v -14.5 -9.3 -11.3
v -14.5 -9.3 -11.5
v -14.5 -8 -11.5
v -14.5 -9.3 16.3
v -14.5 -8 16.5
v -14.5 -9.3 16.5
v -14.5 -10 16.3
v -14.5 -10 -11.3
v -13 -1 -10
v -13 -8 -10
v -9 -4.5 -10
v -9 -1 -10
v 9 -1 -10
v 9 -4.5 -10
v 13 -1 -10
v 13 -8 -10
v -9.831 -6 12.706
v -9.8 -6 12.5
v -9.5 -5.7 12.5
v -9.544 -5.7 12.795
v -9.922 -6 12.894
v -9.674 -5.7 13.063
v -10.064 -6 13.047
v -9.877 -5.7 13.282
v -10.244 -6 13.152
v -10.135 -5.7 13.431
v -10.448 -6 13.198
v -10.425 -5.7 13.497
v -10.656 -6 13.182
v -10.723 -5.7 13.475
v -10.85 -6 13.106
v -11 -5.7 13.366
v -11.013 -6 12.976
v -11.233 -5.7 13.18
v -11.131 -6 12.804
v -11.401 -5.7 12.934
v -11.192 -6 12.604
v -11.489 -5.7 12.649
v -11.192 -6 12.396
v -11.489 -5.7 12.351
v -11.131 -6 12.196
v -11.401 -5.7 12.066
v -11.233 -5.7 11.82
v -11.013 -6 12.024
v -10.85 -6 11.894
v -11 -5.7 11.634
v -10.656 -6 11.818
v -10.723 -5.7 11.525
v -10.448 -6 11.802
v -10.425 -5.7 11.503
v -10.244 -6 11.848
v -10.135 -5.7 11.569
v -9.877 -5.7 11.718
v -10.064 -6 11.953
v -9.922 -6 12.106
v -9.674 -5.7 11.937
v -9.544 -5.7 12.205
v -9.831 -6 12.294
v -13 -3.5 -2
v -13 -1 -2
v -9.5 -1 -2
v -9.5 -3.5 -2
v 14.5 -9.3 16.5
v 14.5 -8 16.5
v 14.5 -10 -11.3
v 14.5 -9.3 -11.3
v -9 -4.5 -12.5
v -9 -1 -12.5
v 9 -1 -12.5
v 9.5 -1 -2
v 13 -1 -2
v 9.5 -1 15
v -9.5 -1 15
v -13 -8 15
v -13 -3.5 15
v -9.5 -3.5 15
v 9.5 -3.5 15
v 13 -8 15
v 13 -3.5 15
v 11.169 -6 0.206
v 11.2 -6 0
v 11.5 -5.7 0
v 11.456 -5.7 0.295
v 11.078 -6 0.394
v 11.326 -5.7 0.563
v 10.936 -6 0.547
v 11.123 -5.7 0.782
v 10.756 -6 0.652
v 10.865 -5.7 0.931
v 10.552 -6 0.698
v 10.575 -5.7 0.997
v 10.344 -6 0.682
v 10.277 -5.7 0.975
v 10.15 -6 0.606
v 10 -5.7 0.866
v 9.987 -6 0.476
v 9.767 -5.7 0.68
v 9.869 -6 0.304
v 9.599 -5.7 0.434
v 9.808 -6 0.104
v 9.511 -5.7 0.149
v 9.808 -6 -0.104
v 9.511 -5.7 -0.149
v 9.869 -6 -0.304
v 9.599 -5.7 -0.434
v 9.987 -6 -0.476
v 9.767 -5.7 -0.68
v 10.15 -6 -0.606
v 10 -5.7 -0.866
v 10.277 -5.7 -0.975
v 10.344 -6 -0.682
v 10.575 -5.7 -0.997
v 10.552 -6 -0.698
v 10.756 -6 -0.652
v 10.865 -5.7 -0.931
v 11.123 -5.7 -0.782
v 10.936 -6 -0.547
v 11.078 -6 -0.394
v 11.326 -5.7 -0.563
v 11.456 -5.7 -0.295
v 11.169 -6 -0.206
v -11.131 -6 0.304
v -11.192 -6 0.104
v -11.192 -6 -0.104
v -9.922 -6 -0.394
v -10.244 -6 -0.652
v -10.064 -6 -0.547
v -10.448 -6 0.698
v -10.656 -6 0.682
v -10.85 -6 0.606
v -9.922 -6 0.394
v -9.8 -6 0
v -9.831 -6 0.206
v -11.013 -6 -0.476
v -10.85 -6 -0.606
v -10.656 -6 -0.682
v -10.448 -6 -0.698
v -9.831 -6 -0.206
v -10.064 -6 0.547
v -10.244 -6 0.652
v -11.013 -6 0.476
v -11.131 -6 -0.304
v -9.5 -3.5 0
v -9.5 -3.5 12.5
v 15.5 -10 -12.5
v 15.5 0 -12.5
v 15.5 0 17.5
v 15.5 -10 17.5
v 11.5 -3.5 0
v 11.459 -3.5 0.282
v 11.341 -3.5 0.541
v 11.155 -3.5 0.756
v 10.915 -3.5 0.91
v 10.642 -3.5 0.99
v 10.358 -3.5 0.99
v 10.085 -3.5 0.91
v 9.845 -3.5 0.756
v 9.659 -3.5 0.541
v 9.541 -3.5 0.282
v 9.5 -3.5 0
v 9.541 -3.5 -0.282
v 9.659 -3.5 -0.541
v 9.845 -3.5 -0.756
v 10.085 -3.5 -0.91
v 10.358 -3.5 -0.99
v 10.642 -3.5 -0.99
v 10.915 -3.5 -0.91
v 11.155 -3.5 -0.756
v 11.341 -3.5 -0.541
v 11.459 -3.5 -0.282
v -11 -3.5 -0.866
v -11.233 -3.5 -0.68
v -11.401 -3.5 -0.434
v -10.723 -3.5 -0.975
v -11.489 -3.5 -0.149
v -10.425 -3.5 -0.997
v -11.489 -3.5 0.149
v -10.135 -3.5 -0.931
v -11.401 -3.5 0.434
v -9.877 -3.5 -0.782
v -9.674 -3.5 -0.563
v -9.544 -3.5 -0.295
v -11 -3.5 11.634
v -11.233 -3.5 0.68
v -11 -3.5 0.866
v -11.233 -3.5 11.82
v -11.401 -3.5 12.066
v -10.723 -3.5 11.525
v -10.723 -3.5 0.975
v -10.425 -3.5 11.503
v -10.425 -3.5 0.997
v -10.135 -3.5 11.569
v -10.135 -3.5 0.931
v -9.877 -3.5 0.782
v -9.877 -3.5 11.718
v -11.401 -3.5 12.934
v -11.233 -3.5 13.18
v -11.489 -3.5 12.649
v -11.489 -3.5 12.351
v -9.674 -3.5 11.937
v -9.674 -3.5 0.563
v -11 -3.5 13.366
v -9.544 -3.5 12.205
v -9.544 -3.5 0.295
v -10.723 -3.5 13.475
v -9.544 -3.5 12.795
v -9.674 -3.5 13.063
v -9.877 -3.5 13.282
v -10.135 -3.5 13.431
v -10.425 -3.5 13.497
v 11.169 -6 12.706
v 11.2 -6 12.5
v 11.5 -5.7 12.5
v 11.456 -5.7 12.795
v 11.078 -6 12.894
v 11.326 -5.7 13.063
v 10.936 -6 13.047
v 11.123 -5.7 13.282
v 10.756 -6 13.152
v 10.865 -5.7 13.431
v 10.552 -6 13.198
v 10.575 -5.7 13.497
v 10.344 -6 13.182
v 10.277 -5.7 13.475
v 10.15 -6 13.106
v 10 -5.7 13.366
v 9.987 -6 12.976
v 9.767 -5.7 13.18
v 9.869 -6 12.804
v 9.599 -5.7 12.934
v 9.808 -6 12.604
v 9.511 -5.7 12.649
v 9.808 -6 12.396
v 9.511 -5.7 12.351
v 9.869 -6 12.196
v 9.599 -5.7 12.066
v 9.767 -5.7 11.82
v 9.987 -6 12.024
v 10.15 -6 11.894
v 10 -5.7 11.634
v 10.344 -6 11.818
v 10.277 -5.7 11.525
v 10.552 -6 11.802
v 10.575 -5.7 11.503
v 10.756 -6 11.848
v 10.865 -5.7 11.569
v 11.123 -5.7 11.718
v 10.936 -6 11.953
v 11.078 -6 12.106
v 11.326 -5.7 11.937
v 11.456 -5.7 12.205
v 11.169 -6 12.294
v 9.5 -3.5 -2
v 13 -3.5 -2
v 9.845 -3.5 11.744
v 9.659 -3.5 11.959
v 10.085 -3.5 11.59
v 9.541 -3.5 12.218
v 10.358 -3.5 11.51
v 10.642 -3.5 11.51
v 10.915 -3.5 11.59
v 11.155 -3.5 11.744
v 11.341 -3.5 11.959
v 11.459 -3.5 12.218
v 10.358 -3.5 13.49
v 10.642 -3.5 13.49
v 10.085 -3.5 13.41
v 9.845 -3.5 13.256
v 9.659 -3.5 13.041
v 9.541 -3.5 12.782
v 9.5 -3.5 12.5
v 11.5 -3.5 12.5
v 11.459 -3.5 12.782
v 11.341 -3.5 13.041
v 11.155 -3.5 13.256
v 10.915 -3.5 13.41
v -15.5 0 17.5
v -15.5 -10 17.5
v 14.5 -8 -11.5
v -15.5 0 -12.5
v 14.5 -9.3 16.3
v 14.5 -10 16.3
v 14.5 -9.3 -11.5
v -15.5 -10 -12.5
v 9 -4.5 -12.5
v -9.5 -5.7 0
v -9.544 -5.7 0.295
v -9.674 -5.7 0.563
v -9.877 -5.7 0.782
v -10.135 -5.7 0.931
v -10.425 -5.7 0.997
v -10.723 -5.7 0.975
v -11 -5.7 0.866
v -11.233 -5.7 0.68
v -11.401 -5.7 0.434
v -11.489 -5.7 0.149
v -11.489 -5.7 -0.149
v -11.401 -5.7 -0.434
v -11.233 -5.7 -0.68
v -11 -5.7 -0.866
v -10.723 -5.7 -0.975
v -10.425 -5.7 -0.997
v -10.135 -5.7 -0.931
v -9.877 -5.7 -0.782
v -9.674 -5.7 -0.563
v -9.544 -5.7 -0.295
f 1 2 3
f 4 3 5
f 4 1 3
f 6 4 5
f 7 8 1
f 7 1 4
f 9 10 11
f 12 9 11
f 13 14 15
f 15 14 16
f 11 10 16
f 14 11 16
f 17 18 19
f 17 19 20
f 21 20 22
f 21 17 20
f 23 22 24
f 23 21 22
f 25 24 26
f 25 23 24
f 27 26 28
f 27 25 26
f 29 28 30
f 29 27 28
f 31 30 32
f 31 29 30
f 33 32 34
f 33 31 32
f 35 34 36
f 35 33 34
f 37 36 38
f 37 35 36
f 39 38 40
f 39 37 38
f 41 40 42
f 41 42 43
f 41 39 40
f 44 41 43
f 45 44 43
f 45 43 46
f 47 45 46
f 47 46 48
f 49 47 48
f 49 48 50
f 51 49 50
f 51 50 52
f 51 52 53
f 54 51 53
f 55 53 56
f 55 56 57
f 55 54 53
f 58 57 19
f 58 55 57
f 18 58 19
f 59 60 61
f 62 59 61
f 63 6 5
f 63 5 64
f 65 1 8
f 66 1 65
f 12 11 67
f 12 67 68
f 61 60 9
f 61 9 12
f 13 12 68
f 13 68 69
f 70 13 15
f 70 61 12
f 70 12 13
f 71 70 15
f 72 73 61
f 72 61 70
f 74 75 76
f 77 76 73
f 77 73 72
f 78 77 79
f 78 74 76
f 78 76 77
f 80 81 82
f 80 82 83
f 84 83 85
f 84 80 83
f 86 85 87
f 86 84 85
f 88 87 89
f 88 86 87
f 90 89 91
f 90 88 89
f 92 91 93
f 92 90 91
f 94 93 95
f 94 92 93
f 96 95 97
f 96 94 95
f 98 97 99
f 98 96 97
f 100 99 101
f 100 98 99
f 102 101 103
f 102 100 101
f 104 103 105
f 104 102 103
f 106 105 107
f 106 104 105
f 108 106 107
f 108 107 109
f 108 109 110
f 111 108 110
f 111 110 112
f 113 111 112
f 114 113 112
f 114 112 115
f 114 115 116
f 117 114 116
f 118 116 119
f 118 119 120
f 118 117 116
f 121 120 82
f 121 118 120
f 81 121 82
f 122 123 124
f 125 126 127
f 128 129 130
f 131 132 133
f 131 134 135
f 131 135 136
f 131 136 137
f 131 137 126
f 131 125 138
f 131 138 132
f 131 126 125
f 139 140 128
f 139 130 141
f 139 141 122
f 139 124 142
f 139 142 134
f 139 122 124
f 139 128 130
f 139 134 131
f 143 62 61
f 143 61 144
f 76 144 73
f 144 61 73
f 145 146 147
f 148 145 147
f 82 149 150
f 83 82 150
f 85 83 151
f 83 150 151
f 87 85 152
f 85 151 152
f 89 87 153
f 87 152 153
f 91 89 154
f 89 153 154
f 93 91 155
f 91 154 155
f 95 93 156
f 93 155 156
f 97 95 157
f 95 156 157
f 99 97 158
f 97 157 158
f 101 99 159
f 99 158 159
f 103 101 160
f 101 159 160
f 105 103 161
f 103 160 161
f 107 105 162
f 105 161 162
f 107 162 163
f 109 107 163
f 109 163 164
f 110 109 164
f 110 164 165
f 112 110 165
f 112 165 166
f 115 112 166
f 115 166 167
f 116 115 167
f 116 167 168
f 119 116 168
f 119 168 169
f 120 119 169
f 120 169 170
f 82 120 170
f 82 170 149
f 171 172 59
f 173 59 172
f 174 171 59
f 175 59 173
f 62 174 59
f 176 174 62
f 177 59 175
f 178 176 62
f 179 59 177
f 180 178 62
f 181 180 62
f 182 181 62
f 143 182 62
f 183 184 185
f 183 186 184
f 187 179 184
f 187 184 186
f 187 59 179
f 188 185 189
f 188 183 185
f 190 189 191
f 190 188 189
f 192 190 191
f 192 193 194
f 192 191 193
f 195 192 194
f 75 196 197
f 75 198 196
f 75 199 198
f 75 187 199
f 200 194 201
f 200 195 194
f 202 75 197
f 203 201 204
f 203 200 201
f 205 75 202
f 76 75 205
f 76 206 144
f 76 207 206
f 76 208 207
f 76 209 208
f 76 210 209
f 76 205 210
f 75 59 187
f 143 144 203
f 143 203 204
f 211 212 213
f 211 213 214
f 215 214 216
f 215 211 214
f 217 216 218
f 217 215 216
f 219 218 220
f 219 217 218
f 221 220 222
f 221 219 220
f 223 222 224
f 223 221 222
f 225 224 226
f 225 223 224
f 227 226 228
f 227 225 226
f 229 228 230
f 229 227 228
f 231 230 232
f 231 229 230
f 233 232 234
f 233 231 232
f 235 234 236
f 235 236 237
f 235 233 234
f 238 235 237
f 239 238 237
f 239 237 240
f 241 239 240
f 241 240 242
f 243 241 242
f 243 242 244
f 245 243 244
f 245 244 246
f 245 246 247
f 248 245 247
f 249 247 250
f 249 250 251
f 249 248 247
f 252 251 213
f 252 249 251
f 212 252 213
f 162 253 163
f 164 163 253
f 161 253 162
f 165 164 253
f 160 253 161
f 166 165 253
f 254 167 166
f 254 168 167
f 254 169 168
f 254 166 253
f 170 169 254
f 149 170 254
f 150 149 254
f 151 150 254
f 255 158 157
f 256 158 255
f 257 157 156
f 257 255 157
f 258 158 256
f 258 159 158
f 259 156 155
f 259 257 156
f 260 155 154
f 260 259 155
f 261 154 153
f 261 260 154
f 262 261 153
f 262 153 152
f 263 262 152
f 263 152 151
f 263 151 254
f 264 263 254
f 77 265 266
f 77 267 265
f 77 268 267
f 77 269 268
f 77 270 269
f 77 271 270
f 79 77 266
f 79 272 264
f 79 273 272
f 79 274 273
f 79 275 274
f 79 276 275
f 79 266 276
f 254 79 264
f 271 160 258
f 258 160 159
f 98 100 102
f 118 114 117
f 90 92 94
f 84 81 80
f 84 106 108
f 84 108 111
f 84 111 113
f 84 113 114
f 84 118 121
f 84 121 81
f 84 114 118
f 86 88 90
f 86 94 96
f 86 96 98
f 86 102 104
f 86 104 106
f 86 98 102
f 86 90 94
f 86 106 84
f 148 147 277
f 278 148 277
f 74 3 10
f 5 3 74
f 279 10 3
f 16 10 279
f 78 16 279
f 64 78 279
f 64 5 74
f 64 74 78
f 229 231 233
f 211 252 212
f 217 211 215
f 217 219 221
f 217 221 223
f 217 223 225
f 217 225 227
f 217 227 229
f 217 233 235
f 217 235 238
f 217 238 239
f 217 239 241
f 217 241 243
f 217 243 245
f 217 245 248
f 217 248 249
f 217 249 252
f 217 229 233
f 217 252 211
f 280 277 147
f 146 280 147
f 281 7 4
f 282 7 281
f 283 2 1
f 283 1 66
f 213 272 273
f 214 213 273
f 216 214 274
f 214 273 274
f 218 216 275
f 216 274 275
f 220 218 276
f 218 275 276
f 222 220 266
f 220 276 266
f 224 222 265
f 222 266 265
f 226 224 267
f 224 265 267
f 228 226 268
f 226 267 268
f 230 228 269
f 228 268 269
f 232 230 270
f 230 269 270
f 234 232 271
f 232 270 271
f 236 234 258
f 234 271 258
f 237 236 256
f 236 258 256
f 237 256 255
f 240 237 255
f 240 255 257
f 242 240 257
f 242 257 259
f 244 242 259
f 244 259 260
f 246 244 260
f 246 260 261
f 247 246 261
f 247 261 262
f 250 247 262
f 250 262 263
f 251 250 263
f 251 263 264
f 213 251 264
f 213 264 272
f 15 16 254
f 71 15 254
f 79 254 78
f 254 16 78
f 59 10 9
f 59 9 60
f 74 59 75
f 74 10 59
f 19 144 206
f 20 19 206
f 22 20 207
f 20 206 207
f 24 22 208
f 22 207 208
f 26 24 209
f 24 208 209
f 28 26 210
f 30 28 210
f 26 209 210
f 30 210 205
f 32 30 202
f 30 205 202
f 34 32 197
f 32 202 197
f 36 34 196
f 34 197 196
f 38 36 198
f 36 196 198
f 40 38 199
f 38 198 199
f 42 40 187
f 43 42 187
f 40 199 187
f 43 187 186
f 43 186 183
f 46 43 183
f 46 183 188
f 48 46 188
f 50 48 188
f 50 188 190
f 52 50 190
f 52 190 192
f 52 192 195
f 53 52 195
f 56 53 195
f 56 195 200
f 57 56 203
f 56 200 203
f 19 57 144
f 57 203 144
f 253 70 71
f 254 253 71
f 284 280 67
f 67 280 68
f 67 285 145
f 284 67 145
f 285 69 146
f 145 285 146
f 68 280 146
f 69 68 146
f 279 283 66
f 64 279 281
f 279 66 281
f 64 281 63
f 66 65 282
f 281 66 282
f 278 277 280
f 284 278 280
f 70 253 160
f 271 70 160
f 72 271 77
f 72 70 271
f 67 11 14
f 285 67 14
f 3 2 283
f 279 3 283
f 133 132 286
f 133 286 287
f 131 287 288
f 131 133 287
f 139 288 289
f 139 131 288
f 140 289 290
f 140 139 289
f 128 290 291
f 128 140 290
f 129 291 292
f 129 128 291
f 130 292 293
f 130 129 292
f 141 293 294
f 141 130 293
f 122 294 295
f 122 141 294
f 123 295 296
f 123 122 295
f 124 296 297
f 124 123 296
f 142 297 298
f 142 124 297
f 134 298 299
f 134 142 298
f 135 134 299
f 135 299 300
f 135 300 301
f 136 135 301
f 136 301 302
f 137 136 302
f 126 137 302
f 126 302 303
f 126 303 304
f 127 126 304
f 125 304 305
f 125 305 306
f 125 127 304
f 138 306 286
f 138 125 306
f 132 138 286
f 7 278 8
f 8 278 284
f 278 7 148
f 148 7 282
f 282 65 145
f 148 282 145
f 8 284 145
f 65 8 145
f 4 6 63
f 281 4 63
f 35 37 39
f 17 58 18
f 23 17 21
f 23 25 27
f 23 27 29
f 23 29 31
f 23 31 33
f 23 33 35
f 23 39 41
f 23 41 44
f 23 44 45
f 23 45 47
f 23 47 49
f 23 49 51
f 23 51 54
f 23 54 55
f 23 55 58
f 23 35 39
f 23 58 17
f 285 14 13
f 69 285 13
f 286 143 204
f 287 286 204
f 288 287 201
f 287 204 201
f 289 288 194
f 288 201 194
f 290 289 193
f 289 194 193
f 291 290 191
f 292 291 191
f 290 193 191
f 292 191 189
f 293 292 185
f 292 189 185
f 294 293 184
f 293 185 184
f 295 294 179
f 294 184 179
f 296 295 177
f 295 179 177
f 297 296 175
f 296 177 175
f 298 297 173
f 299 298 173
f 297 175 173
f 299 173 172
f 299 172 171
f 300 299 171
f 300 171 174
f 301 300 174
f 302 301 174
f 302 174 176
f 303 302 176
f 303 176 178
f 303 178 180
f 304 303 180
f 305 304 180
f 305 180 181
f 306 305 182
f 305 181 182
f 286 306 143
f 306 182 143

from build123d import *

# Parameters (mm, degrees)
F0_W      = 15.5
F0_H      = 15
F1_DEPTH  = 10
F2_W      = 29
F2_H      = 28
F3_DEPTH  = 2
F4_W      = 26
F4_H      = 25
F5_DEPTH  = 7
F6_W      = 3.5
F6_H      = 17
F7_DEPTH  = 2.5
F8_R      = 1
F9_DEPTH  = 2.5
F10_W     = 18
F10_H     = 3.5
F11_DEPTH = 25
F12_SIZE  = 0.3
F13_W     = 29
F13_H     = 0.7
F14_DEPTH = 0.2
F15_W     = 29
F15_H     = 0.7
F16_DEPTH = 0.2


with BuildPart() as f1:
    # F0 (on Front) → F1 (new body)
    with BuildSketch(Plane.XZ):
        with Locations((-7.75, 10)):
            Rectangle(F0_W, F0_H)
        with Locations((7.75, 10)):
            Rectangle(F0_W, F0_H)
        with Locations((-7.75, -5)):
            Rectangle(F0_W, F0_H)
        with Locations((7.75, -5)):
            Rectangle(F0_W, F0_H)
    extrude(amount=F1_DEPTH)

    # F2 (on face) → F3 (cut)
    with BuildSketch(Plane.XZ.offset(10)):
        with Locations((0, 2.5)):
            Rectangle(F2_W, F2_H)
    extrude(amount=-F3_DEPTH, mode=Mode.SUBTRACT)

    # F4 (on face) → F5 (cut)
    with BuildSketch(Plane.XZ.offset(8)):
        with Locations((0, 2.5)):
            Rectangle(F4_W, F4_H)
    extrude(amount=-F5_DEPTH, mode=Mode.SUBTRACT)

    # F6 (on face) → F7 (join)
    with BuildSketch(Plane.XZ.offset(1)):
        with Locations((-11.25, 6.5)):
            Rectangle(F6_W, F6_H)
        with Locations((11.25, 6.5)):
            Rectangle(F6_W, F6_H)
    extrude(amount=F7_DEPTH)

    # F8 (on face) → F9 (join)
    with BuildSketch(Plane.XZ.offset(3.5)):
        with Locations((-10.5, 12.5)):
            Circle(F8_R)
        with Locations((-10.5, 0)):
            Circle(F8_R)
        with Locations((10.5, 12.5)):
            Circle(F8_R)
        with Locations((10.5, 0)):
            Circle(F8_R)
    extrude(amount=F9_DEPTH)

    # F10 (on face) → F11 (cut)
    with BuildSketch(Plane.XY.offset(-10)):
        with Locations((0, -2.75)):
            Rectangle(F10_W, F10_H)
    extrude(amount=-F11_DEPTH, mode=Mode.SUBTRACT)

    # F12
    f12_edges = [f1.edges().sort_by_distance(p)[0] for p in [
        (-11.5, -6, 12.5),
        (-11.5, -6, 0),
        (9.5, -6, 12.5),
        (9.5, -6, 0),
    ]]
    chamfer(f12_edges, length=F12_SIZE)

    # F13 (on face) → F14 (join)
    with BuildSketch(Plane(origin=(0, 0, 16.5), x_dir=(1, 0, 0), z_dir=(0, 0, -1))):
        with Locations((0, 9.65)):
            Rectangle(F13_W, F13_H)
    extrude(amount=F14_DEPTH)

    # F15 (on face) → F16 (join)
    with BuildSketch(Plane.XY.offset(-11.5)):
        with Locations((0, -9.65)):
            Rectangle(F15_W, F15_H)
    extrude(amount=F16_DEPTH)


solid = f1.part
